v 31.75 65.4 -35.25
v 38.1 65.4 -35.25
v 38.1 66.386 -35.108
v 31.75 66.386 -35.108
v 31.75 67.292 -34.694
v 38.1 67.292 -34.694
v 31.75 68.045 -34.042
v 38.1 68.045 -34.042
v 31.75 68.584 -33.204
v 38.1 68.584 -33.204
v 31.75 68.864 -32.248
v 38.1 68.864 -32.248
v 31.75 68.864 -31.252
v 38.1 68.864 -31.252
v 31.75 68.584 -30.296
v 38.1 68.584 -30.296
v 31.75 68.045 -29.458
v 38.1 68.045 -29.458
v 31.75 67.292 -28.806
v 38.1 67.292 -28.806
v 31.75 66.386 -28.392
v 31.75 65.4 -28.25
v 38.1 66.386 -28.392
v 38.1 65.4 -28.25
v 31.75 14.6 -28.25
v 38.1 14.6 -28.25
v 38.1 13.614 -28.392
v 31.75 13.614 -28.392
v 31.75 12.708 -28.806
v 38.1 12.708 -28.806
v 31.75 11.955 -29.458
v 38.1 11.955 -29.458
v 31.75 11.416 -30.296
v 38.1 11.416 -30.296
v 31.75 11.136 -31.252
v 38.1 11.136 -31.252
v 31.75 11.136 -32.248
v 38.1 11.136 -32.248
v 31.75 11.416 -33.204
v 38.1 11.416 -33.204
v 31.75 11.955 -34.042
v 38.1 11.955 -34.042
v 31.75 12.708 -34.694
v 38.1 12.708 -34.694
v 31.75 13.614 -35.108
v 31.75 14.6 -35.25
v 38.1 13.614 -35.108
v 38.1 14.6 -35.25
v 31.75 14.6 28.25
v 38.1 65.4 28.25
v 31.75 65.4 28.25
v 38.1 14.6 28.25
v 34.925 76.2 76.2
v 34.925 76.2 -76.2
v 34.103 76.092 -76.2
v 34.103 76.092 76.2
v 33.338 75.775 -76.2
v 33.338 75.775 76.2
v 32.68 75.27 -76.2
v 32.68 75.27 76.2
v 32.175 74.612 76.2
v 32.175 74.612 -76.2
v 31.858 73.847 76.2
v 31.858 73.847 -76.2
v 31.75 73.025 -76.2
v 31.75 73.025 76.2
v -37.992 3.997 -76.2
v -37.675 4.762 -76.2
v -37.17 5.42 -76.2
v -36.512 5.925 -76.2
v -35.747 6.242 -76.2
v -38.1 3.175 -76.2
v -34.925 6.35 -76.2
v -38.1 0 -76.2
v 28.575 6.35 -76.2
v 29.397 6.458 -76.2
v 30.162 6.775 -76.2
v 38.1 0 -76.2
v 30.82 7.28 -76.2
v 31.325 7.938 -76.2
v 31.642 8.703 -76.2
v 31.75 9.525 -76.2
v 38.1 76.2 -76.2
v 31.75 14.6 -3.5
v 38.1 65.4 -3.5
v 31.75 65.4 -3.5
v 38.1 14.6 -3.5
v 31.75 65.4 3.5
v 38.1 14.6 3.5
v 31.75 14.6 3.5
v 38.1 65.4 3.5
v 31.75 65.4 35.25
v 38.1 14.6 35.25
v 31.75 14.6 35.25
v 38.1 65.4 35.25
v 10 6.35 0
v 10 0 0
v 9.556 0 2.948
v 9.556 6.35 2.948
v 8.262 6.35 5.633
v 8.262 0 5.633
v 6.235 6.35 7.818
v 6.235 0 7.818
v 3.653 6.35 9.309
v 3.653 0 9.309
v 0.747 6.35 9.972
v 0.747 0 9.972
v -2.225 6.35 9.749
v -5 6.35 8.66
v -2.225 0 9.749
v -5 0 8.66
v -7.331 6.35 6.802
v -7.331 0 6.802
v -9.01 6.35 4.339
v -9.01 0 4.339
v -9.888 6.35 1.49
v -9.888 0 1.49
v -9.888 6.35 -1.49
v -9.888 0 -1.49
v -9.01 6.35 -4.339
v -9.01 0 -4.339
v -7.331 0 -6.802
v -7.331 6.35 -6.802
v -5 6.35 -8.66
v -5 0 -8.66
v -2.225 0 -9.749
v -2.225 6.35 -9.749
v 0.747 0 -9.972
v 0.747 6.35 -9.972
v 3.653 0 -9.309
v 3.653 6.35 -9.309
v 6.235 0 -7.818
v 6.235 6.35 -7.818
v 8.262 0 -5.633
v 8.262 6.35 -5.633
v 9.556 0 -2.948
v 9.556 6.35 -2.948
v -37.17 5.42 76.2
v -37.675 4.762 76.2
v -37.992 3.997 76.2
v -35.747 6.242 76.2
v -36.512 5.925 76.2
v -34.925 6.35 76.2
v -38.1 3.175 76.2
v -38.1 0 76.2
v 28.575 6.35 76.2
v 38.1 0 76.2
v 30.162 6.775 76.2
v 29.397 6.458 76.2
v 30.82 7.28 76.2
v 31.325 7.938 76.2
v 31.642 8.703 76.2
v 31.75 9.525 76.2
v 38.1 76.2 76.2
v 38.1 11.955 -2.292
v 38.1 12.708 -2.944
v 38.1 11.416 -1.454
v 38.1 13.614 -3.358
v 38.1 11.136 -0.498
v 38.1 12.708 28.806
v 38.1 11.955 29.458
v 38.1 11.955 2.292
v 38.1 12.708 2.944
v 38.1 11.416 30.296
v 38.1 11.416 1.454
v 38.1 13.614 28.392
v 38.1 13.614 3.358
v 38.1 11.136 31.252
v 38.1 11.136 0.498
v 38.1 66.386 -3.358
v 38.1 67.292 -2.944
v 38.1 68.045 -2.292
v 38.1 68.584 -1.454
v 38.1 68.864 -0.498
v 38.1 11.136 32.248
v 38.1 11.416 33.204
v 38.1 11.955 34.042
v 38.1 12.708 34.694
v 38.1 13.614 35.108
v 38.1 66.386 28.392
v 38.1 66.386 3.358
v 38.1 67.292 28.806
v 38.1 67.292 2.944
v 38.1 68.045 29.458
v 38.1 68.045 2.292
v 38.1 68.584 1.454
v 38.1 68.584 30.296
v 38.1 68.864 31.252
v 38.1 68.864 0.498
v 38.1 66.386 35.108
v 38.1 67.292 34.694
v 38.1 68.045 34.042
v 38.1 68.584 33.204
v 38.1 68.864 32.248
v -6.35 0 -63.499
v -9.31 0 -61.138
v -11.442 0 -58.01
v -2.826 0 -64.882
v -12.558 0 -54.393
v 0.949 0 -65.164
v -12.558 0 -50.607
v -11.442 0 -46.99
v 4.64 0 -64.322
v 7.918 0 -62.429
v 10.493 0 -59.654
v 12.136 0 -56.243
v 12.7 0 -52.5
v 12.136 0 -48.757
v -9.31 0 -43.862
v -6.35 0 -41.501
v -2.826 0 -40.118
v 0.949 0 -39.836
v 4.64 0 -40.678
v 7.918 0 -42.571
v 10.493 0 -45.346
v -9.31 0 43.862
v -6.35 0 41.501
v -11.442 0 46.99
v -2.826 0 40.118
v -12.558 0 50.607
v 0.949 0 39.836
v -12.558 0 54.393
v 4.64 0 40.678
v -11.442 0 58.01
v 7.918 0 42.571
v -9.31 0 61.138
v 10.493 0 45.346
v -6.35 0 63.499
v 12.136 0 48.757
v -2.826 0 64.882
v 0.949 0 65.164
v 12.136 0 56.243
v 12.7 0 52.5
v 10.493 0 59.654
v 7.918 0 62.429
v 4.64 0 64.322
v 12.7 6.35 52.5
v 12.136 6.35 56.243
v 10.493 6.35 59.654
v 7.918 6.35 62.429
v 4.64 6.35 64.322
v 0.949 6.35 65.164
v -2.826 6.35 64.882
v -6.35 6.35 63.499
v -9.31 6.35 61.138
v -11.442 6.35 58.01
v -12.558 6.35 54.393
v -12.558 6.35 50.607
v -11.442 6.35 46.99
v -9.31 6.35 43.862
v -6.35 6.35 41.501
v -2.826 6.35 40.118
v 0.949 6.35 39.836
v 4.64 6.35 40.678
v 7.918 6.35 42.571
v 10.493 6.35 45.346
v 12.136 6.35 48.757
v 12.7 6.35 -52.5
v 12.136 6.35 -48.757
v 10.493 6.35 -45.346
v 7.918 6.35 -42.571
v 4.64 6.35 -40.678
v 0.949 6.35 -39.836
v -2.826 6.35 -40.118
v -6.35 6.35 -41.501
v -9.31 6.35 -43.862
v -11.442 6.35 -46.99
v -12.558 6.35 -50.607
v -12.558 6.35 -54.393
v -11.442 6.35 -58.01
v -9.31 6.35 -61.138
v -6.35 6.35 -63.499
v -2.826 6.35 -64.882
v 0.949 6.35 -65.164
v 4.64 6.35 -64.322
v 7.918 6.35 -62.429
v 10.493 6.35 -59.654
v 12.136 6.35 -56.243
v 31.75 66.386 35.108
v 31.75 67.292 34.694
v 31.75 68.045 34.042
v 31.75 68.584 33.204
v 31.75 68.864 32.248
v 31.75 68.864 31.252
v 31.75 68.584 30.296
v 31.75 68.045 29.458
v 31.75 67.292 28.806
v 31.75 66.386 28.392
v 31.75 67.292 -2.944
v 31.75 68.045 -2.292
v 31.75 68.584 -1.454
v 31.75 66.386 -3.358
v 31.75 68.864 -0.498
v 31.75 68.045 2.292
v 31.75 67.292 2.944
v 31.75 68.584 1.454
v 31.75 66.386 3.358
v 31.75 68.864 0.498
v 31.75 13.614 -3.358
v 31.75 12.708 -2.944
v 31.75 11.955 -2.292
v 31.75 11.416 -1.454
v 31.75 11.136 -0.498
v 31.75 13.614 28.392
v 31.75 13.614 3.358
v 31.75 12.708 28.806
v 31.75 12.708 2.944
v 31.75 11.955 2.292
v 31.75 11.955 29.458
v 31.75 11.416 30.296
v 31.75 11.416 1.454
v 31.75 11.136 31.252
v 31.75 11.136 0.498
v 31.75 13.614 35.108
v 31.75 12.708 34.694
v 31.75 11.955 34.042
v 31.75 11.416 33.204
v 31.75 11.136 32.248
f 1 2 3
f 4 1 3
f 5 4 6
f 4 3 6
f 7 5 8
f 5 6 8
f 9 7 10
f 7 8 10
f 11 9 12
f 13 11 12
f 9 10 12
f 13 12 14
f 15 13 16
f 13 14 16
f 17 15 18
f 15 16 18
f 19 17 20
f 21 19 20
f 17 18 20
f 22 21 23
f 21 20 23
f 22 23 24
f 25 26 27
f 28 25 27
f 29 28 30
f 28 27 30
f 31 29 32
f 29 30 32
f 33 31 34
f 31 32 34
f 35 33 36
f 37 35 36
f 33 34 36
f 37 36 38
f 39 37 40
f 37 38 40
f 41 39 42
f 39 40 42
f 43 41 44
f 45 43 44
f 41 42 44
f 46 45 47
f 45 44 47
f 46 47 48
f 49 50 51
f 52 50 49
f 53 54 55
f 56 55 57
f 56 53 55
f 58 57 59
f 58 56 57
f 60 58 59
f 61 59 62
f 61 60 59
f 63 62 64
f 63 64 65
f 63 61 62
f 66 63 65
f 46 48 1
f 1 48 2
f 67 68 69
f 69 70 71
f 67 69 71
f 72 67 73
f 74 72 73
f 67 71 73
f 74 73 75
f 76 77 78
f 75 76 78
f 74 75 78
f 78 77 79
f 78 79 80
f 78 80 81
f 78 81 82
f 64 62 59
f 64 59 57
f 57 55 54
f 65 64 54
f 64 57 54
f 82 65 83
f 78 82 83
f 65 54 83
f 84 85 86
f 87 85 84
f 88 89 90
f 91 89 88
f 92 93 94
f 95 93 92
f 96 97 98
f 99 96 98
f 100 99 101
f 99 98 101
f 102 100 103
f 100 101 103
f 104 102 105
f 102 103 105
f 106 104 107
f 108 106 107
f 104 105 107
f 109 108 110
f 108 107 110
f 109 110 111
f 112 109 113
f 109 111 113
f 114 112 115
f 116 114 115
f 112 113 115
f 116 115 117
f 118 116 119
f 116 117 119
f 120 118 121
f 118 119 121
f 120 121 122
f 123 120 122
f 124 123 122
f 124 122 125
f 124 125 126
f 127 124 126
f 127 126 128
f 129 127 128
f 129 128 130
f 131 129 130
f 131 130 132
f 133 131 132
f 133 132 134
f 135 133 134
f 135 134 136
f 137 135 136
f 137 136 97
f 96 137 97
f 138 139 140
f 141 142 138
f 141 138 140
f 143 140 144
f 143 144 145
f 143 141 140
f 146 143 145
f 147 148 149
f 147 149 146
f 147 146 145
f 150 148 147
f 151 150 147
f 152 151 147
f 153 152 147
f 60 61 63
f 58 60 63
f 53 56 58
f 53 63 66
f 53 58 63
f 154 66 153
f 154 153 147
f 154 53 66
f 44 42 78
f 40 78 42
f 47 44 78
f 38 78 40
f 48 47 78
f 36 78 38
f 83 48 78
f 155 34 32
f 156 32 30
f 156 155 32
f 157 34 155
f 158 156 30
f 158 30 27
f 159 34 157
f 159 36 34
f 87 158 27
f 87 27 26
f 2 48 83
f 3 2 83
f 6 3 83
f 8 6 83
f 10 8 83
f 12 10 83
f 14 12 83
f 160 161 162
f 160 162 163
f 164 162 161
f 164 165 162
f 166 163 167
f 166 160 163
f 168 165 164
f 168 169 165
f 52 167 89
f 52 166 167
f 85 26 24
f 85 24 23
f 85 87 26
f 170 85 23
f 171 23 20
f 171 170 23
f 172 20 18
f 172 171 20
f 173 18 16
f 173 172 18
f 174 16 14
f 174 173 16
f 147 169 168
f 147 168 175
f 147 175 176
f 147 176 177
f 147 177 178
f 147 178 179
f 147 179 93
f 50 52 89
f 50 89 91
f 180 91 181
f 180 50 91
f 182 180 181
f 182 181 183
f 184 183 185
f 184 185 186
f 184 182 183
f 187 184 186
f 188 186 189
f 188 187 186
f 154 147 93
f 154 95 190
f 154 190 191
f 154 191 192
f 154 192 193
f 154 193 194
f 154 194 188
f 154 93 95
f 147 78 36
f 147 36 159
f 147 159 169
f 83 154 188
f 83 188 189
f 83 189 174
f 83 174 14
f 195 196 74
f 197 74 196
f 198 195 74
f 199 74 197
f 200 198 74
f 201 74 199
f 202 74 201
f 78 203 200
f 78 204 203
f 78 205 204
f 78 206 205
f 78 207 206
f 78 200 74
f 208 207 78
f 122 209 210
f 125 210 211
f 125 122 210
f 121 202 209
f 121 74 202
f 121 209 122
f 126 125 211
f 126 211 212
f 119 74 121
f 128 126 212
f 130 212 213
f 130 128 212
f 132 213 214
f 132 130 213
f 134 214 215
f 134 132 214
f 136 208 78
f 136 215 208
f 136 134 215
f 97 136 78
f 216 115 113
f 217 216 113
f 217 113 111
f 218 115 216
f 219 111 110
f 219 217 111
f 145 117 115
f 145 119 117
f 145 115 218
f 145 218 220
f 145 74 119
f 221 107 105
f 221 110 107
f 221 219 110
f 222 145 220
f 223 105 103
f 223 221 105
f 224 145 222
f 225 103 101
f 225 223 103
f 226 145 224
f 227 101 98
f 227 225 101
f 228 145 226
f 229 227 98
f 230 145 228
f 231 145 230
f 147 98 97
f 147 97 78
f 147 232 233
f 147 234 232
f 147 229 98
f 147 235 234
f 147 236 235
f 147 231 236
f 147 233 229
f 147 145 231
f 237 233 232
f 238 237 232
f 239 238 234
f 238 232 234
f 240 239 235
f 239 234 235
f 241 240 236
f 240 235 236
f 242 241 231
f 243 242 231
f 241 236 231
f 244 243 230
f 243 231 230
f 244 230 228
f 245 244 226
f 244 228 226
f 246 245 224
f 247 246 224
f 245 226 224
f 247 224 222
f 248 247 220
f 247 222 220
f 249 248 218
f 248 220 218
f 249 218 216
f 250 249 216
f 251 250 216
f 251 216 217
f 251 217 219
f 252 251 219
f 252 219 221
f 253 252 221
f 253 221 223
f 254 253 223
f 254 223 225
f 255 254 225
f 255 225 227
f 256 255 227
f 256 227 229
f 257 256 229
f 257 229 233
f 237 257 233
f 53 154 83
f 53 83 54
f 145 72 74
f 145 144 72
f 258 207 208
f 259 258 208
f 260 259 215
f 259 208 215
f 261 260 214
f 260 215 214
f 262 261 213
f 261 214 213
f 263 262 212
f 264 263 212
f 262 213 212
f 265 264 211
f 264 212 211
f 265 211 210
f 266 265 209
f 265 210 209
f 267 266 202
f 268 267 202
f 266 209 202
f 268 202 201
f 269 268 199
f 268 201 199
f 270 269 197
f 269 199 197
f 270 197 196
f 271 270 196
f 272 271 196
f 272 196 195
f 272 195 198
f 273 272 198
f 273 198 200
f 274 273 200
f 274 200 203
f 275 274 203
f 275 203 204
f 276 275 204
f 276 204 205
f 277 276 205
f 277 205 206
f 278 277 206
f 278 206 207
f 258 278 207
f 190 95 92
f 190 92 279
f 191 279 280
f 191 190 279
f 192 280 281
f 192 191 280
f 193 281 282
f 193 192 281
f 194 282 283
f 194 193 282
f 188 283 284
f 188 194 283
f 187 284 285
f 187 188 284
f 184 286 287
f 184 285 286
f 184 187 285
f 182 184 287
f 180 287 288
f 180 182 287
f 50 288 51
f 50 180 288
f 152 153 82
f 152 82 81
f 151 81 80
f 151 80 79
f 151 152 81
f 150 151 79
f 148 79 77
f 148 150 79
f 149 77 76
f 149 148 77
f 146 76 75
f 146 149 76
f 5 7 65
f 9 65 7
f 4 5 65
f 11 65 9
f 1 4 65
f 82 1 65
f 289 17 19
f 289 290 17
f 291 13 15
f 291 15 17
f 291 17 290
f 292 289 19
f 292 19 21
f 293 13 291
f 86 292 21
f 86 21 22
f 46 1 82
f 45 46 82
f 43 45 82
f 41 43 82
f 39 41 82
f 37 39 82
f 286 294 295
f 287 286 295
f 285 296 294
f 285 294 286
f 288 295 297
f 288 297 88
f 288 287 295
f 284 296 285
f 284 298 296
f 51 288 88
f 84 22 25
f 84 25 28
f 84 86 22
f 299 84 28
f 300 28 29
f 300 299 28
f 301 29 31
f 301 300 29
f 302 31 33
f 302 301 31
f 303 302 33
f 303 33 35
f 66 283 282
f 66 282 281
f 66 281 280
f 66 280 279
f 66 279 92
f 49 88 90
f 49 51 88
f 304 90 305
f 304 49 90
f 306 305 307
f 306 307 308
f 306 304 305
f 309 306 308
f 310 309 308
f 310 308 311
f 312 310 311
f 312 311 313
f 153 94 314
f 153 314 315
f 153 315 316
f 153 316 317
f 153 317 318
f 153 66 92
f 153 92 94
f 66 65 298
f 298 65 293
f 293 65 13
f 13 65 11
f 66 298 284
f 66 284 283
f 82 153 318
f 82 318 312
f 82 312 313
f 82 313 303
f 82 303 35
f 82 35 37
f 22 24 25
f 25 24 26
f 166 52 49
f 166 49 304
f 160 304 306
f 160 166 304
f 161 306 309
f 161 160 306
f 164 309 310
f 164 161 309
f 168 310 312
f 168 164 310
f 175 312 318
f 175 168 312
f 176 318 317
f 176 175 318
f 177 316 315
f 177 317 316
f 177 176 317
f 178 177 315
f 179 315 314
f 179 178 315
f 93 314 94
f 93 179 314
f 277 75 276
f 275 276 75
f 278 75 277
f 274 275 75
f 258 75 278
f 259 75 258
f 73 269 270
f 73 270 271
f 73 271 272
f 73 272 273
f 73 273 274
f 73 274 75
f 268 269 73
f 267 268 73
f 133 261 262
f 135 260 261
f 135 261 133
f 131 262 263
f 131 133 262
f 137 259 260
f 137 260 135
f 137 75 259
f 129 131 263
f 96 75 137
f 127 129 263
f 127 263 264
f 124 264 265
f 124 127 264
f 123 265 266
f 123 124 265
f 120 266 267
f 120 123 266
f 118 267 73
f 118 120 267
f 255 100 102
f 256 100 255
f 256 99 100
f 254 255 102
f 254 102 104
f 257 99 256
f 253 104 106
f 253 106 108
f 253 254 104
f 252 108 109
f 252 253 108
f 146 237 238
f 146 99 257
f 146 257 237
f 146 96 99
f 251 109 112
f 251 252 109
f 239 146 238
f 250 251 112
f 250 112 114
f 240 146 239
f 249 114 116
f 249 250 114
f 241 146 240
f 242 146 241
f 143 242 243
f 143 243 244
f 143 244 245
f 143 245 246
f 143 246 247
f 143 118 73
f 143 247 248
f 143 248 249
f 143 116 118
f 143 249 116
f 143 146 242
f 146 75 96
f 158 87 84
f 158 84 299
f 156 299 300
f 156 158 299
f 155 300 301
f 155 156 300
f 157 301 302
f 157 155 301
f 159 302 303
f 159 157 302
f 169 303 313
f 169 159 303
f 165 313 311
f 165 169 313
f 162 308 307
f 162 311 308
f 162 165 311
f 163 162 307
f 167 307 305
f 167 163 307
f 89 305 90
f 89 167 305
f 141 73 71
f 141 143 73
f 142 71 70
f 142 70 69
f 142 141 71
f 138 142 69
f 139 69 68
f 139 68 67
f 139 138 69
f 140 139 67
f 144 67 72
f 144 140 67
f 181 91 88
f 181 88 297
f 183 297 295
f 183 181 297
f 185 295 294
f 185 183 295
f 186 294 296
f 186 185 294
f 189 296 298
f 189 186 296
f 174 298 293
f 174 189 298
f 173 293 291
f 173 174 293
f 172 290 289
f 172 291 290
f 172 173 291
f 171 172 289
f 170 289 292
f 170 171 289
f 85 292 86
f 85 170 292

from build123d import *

# Parameters (mm, degrees)
BOSS_EXTRUDE1_DEPTH = 76.2
CUT_EXTRUDE1_DEPTH  = 10
SKETCH4_R           = 10
SKETCH4_R_2         = 12.7
CUT_EXTRUDE2_DEPTH  = 10


with BuildPart() as part:
    # Sketch2 → Boss-Extrude1 (new body, symmetric)
    with BuildSketch(Plane.XY):
        with BuildLine():
            Line((-38.1, 0), (38.1, 0))
            Line((38.1, 0), (38.1, 76.2))
            Line((38.1, 76.2), (34.925, 76.2))
            ThreePointArc((34.925, 76.2), (32.67993597, 75.27006403), (31.75, 73.025))
            Line((31.75, 73.025), (31.75, 9.525))
            ThreePointArc((31.75, 9.525), (30.82006403, 7.27993597), (28.575, 6.35))
            Line((28.575, 6.35), (-34.925, 6.35))
            ThreePointArc((-34.925, 6.35), (-37.17006403, 5.42006403), (-38.1, 3.175))
            Line((-38.1, 3.175), (-38.1, 0))
        make_face()
    extrude(amount=BOSS_EXTRUDE1_DEPTH, both=True)

    # Sketch3 → Cut-Extrude1 (cut)
    with BuildSketch(Plane(origin=(38.1, 0, 0), x_dir=(0, 0, -1), z_dir=(1, 0, 0))):
        with BuildLine():
            Line((-28.25, 65.4), (-28.25, 14.6))
            ThreePointArc((-28.25, 14.6), (-31.75, 11.1), (-35.25, 14.6))
            Line((-35.25, 14.6), (-35.25, 65.4))
            ThreePointArc((-35.25, 65.4), (-31.75, 68.9), (-28.25, 65.4))
        make_face()
        with BuildLine():
            Line((28.25, 65.4), (28.25, 14.6))
            ThreePointArc((28.25, 14.6), (31.75, 11.1), (35.25, 14.6))
            Line((35.25, 14.6), (35.25, 65.4))
            ThreePointArc((35.25, 65.4), (31.75, 68.9), (28.25, 65.4))
        make_face()
        with BuildLine():
            Line((3.5, 65.4), (3.5, 14.6))
            ThreePointArc((3.5, 14.6), (0, 11.1), (-3.5, 14.6))
            Line((-3.5, 14.6), (-3.5, 65.4))
            ThreePointArc((-3.5, 65.4), (0, 68.9), (3.5, 65.4))
        make_face()
    extrude(amount=-CUT_EXTRUDE1_DEPTH, mode=Mode.SUBTRACT)

    # Sketch4 → Cut-Extrude2 (cut)
    with BuildSketch(Plane.XZ):
        Circle(SKETCH4_R)
        with Locations((0, 52.5)):
            Circle(SKETCH4_R_2)
        with Locations((0, -52.5)):
            Circle(SKETCH4_R_2)
    extrude(amount=-CUT_EXTRUDE2_DEPTH, mode=Mode.SUBTRACT)


solid = part.part
